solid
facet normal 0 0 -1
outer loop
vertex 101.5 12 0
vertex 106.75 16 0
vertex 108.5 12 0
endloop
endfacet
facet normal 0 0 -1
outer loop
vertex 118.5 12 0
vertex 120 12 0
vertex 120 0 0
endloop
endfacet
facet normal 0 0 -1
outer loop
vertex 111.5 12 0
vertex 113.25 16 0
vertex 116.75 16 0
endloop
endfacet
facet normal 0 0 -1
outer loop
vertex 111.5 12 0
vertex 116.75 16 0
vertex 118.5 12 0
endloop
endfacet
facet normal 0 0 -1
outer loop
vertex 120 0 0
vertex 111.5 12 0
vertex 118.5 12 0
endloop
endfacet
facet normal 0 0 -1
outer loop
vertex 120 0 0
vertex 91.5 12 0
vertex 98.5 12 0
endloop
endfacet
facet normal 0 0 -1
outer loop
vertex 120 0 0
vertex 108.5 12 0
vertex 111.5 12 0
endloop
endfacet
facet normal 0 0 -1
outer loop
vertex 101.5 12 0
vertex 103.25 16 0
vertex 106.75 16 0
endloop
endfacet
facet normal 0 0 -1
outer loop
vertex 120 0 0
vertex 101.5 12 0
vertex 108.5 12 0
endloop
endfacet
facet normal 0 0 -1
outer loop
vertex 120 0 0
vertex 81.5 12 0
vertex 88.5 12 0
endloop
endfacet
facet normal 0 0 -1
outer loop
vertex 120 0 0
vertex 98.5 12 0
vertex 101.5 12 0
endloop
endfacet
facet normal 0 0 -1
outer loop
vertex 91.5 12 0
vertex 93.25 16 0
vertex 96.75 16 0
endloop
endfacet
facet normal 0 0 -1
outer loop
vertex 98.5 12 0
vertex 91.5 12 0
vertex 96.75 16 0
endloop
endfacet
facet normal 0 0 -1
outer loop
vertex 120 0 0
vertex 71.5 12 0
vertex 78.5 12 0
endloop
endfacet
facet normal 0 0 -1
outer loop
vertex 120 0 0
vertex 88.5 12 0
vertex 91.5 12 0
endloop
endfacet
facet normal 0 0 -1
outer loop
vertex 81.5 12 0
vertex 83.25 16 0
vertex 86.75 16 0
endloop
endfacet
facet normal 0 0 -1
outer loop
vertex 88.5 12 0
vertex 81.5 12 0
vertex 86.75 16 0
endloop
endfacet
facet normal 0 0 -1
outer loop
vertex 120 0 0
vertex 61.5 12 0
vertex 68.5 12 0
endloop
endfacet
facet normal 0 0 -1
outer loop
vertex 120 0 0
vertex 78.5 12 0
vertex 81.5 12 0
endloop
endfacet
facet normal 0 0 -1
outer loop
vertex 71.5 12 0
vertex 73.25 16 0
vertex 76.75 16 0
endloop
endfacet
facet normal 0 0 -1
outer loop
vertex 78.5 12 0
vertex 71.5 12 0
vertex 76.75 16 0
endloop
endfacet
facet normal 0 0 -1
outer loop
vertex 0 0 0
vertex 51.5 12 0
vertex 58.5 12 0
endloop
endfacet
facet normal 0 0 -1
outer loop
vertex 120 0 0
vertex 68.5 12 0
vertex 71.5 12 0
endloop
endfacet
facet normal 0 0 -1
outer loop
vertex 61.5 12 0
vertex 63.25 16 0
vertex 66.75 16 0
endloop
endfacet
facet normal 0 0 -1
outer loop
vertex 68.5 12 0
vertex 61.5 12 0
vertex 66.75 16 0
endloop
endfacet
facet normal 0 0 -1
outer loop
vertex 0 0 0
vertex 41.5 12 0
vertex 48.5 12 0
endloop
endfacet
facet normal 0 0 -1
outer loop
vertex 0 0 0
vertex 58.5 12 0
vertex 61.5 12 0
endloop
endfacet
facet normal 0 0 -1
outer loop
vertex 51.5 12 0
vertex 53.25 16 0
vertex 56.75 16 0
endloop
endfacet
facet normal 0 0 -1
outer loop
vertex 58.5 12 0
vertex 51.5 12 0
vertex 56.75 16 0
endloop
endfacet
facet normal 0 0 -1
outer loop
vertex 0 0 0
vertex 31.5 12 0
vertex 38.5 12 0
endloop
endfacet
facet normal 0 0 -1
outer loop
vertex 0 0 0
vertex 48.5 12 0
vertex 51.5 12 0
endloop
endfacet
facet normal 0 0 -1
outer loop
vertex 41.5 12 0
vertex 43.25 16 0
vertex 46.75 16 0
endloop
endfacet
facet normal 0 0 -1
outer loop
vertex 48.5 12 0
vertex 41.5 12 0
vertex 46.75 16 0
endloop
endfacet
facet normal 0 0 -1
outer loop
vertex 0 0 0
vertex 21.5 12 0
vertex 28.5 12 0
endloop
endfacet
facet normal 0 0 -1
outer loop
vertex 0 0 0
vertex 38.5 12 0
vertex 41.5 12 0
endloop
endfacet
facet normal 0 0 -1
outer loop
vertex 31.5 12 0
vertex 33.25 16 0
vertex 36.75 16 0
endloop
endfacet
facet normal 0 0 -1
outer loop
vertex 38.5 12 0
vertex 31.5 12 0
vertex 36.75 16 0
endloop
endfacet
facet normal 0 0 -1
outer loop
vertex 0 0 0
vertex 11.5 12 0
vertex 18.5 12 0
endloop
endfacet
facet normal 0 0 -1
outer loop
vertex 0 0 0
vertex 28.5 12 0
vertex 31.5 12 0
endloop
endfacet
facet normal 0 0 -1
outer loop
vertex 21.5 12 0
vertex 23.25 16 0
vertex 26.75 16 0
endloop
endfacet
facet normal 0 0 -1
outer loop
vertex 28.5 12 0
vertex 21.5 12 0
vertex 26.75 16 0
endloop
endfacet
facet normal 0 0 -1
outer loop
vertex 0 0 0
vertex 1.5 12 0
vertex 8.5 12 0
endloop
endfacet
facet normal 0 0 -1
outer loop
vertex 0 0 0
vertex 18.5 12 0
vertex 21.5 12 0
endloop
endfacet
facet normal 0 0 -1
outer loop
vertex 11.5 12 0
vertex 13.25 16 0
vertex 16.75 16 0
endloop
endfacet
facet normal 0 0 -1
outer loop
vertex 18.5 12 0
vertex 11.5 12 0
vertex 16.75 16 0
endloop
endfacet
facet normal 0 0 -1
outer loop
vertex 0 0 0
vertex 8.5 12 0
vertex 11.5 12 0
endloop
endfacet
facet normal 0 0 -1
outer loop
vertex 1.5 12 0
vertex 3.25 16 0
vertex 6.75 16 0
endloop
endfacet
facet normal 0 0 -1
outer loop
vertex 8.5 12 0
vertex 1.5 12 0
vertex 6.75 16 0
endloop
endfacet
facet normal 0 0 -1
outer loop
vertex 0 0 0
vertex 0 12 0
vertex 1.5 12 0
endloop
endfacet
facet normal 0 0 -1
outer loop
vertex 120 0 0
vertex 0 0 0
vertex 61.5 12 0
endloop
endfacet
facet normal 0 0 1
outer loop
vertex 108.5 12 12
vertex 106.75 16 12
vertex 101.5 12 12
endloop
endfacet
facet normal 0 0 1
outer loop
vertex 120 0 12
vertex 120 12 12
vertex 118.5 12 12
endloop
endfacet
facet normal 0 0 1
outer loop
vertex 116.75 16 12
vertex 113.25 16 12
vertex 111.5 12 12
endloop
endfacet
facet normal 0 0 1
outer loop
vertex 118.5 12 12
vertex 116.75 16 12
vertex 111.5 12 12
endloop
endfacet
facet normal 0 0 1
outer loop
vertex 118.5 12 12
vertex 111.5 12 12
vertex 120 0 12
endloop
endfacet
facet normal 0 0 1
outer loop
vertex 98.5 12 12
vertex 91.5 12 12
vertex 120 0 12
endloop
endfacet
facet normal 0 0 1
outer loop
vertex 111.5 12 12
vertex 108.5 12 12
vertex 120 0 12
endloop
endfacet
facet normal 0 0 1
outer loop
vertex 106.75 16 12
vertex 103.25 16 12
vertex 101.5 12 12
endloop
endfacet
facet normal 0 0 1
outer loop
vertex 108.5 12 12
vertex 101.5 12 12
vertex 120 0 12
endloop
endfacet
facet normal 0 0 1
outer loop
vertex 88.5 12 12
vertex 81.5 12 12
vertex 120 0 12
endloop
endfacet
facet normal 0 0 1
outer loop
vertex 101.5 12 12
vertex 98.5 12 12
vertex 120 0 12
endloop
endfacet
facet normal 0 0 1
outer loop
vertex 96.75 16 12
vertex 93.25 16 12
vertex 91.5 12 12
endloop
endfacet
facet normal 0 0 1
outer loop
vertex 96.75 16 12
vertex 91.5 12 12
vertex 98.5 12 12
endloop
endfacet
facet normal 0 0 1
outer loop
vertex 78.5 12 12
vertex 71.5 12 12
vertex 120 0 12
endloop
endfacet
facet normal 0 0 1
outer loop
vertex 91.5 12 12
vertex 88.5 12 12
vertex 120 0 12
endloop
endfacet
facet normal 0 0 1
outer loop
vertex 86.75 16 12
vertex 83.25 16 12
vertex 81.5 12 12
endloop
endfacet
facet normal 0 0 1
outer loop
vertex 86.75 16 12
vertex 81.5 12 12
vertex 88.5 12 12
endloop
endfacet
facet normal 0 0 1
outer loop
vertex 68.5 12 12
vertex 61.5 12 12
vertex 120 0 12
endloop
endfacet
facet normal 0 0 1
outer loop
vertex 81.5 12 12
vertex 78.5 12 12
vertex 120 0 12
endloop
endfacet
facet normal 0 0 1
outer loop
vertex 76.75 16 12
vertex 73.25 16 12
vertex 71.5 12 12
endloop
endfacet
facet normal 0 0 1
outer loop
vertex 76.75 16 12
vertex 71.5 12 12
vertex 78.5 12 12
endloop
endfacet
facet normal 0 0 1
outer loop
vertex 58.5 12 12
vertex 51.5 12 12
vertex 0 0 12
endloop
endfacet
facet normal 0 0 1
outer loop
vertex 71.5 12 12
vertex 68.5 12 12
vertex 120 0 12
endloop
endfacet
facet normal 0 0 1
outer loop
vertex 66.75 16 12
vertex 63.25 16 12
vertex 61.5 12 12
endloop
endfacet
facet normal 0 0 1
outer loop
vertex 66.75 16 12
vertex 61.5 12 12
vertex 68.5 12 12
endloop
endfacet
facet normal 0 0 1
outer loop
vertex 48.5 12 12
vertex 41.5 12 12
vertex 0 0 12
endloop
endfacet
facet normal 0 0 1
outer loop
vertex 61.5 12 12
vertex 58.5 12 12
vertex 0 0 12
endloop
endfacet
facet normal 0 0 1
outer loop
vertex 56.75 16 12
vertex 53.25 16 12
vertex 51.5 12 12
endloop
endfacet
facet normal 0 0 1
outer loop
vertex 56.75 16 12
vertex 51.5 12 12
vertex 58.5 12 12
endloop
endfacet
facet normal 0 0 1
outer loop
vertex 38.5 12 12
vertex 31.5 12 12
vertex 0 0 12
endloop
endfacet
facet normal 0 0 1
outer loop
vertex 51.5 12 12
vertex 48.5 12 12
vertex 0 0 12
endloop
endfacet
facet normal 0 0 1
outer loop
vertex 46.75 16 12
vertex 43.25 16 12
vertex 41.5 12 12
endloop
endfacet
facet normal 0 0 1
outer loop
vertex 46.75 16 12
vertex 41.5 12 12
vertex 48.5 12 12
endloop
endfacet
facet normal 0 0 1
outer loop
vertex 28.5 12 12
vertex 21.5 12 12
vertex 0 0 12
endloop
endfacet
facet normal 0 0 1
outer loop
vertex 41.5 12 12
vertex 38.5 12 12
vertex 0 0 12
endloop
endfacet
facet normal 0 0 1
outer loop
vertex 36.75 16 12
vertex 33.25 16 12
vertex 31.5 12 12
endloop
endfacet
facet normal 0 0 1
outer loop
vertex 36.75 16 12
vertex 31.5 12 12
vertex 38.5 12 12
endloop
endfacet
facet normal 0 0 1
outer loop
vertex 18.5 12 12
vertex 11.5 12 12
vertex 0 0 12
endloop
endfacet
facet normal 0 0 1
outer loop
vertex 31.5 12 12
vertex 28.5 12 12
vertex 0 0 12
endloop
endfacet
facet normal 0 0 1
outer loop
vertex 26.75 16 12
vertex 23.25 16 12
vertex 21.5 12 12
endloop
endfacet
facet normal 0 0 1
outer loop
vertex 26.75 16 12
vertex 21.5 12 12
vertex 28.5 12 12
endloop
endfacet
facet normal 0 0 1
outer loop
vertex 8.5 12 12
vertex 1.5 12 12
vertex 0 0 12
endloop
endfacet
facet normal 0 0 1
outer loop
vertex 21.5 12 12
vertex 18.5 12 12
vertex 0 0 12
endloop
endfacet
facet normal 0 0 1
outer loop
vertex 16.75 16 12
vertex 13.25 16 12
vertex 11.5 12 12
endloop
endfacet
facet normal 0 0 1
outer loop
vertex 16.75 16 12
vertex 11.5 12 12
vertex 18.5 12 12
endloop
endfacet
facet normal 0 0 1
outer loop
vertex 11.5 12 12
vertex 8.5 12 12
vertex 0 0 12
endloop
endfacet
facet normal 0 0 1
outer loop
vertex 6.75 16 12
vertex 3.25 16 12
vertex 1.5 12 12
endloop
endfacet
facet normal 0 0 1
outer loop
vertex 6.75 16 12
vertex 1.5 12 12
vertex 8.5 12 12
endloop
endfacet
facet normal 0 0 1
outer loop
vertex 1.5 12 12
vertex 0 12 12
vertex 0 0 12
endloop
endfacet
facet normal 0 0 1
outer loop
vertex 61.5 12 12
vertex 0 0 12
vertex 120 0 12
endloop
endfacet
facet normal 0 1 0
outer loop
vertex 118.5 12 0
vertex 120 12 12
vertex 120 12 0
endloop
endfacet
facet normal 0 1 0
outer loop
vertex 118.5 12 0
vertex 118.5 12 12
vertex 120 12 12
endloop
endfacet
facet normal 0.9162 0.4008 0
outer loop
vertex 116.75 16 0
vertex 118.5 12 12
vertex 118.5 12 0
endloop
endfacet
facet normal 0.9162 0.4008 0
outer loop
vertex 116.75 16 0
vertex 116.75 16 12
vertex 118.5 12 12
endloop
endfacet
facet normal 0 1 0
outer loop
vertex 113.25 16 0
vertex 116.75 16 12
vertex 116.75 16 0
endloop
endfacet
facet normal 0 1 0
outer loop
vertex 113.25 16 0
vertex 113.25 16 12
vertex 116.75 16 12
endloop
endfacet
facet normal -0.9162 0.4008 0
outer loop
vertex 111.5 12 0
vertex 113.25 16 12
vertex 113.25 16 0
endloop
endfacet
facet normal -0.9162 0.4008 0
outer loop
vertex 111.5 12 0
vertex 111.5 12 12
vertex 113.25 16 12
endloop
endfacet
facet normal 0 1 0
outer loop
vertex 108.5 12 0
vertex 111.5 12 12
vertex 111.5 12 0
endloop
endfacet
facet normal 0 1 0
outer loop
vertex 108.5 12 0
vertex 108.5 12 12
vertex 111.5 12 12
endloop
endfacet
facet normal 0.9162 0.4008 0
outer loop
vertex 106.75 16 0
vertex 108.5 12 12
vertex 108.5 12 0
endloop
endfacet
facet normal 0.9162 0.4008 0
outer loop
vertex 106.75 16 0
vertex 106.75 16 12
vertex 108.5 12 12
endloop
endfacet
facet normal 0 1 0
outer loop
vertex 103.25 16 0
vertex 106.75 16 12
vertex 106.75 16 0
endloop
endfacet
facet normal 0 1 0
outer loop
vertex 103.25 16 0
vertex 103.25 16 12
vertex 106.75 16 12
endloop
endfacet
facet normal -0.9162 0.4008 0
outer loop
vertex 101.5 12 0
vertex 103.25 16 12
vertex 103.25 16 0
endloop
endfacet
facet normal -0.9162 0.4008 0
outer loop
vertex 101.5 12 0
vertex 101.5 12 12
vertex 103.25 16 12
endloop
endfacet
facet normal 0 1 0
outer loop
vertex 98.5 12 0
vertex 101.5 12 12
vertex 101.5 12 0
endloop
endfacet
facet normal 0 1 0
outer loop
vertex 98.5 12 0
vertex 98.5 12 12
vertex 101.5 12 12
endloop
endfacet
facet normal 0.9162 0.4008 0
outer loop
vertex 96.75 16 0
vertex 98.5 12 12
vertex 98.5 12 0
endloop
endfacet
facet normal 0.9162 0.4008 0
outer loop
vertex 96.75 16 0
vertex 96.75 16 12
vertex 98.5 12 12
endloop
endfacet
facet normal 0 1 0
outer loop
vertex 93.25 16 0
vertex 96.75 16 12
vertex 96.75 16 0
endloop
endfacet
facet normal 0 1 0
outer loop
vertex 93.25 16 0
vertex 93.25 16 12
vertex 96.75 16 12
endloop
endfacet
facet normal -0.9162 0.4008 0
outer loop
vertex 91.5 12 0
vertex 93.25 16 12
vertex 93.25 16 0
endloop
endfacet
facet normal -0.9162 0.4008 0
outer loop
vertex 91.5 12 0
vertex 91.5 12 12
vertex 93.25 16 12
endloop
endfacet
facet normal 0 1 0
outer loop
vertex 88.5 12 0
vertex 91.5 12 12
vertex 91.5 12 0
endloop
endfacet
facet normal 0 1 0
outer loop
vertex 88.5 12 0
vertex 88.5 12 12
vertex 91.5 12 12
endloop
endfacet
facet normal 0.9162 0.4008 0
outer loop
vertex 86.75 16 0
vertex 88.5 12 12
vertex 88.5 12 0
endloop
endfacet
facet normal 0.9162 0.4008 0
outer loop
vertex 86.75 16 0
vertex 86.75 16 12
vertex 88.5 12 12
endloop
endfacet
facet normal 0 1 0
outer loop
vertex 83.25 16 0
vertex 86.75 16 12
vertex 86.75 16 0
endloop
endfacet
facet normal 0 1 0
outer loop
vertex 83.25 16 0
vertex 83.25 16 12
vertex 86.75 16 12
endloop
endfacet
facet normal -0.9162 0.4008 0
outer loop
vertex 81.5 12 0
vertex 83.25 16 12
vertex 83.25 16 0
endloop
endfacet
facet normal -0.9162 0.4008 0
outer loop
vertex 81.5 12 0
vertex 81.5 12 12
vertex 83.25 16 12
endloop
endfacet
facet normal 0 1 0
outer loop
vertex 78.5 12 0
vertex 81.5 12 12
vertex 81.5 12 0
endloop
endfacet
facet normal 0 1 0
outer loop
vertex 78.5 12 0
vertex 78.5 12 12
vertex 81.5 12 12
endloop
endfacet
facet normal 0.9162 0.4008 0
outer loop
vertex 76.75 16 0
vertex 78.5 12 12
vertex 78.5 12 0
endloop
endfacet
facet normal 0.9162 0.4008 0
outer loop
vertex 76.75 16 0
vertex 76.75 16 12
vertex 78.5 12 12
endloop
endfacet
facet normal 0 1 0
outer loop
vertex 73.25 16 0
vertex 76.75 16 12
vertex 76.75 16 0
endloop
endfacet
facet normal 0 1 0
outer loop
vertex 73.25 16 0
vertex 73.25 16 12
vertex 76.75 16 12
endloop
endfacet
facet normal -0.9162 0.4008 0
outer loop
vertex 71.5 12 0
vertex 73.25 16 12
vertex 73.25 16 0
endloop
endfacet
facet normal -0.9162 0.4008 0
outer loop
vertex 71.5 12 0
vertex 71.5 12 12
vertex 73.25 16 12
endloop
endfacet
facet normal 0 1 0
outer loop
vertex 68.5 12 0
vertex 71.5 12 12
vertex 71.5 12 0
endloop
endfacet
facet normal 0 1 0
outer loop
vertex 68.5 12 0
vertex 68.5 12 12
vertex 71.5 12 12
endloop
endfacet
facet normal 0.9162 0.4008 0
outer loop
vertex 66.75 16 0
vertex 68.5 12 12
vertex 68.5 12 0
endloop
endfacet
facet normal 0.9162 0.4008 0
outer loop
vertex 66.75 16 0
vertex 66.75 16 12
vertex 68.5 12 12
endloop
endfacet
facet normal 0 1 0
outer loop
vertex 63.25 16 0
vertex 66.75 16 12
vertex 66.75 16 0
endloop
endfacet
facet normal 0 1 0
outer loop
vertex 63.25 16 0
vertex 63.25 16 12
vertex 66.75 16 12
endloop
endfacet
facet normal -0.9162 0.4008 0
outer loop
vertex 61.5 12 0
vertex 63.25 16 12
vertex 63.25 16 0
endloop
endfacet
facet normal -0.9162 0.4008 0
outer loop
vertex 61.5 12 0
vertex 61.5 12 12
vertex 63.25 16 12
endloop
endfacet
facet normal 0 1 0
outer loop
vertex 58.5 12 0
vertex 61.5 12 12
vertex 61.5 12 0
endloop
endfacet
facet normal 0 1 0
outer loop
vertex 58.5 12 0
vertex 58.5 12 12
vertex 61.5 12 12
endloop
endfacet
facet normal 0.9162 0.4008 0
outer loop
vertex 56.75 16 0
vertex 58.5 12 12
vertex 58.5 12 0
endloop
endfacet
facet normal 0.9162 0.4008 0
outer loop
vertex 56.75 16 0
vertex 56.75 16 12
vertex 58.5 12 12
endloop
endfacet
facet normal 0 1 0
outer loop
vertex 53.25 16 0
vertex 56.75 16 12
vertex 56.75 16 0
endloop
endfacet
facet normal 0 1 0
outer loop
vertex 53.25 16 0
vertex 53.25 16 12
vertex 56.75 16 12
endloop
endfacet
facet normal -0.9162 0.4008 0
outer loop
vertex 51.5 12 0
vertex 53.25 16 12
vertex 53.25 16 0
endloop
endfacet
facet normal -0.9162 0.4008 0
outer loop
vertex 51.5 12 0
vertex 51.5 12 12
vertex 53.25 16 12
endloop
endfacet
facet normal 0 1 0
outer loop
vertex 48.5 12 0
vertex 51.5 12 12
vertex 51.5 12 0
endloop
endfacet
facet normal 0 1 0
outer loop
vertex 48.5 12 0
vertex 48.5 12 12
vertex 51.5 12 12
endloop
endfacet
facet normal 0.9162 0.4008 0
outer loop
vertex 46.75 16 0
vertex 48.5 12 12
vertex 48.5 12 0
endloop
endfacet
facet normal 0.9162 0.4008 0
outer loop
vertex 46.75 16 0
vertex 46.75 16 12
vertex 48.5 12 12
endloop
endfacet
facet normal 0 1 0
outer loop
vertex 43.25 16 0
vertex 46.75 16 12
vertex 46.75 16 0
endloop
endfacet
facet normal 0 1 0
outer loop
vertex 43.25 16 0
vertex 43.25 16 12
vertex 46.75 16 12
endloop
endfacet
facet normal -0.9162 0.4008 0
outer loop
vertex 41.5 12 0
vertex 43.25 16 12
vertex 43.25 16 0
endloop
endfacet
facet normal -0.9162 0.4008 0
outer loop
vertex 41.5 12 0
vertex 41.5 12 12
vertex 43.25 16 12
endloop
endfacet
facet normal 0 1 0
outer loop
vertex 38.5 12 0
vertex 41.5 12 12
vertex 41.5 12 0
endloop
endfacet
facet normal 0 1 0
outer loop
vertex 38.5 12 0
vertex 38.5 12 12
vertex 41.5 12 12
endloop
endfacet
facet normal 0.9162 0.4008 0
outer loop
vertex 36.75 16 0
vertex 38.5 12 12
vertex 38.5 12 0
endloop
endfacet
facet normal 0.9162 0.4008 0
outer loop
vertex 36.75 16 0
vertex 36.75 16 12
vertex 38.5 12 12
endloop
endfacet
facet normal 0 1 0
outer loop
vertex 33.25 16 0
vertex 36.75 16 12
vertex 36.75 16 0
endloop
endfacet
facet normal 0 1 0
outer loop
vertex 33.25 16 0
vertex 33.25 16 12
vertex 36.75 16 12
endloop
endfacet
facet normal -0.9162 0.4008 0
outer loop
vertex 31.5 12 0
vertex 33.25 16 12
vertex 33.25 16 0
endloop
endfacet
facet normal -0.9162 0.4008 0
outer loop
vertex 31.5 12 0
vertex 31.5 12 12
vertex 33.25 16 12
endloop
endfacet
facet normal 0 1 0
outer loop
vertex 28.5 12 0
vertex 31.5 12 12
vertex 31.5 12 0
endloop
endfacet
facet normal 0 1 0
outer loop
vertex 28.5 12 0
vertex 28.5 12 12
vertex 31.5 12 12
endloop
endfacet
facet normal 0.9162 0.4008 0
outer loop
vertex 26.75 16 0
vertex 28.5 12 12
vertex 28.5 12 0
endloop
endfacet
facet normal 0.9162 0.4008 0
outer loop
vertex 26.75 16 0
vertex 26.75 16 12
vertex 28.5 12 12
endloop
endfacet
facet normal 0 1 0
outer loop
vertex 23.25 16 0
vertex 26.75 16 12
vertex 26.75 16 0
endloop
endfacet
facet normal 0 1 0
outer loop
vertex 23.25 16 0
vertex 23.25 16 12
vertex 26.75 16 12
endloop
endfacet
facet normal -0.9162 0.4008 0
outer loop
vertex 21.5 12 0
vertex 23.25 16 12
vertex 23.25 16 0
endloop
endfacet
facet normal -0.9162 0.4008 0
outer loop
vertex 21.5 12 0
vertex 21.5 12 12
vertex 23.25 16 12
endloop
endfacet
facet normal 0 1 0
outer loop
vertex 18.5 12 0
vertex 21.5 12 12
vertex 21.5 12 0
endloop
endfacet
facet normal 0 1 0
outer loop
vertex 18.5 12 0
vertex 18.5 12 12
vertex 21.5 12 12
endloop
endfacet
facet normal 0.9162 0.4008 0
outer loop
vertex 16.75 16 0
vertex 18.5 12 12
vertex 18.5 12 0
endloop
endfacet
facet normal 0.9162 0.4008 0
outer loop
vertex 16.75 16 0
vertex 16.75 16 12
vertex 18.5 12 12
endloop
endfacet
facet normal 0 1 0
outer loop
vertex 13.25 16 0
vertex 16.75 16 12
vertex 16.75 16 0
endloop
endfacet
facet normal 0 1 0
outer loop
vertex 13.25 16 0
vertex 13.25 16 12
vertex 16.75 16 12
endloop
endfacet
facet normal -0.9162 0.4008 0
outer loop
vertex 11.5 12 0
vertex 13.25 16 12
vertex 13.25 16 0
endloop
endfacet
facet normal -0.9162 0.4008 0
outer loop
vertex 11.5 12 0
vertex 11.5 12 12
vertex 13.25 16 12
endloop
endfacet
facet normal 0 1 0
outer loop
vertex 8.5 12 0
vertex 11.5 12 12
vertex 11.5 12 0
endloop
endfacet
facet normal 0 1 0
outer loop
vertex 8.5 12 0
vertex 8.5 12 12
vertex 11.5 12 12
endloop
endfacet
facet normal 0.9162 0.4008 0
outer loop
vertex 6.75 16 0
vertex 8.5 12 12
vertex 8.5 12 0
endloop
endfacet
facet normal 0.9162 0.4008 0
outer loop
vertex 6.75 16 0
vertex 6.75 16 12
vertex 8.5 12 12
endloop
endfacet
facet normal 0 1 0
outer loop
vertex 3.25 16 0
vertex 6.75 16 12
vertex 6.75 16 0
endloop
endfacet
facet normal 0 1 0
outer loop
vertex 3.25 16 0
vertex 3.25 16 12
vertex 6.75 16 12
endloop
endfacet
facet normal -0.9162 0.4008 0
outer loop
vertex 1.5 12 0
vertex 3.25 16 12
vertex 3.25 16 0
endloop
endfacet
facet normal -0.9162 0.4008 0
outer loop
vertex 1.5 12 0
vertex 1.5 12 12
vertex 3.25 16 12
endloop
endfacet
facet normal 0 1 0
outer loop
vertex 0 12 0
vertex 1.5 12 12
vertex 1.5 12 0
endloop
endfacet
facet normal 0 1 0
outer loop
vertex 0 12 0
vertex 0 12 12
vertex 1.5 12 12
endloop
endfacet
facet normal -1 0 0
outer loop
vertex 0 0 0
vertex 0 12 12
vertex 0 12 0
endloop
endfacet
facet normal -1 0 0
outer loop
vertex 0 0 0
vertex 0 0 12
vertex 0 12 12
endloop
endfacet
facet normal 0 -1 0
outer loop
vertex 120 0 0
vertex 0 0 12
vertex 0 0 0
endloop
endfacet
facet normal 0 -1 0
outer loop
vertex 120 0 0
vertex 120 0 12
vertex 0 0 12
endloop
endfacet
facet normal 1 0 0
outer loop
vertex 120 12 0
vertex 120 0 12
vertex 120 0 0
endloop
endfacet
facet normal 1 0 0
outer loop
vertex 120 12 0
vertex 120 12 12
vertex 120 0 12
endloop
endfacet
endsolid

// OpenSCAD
$fn = 32;

// ----------------------------------------------------------------------
// Gear rack: 12 teeth, pitch 10 mm
// ----------------------------------------------------------------------

// --- parameters (mm) ---
teeth = 12;               // number of teeth
pitch = 10;               // tooth pitch, X
root_w = 7;               // tooth width at the root
tip_w = 3.5;              // tooth width at the tip
base_h = 12;              // rack body height, Y
tooth_h = 4;              // tooth height above the body
plate_t = 12;             // rack width, Z (extrusion height)
fit_tol = 0.05;           // declared fit tolerance (prompt contract)
free_tol = 0.3;           // declared free tolerance (prompt contract)

rack_l = teeth * pitch;  // overall length
total_h = base_h + tooth_h;  // overall height

profile = [[0, 0], [120, 0], [120, 12], [118.5, 12], [116.75, 16], [113.25, 16], [111.5, 12], [108.5, 12], [106.75, 16], [103.25, 16], [101.5, 12], [98.5, 12], [96.75, 16], [93.25, 16], [91.5, 12], [88.5, 12], [86.75, 16], [83.25, 16], [81.5, 12], [78.5, 12], [76.75, 16], [73.25, 16], [71.5, 12], [68.5, 12], [66.75, 16], [63.25, 16], [61.5, 12], [58.5, 12], [56.75, 16], [53.25, 16], [51.5, 12], [48.5, 12], [46.75, 16], [43.25, 16], [41.5, 12], [38.5, 12], [36.75, 16], [33.25, 16], [31.5, 12], [28.5, 12], [26.75, 16], [23.25, 16], [21.5, 12], [18.5, 12], [16.75, 16], [13.25, 16], [11.5, 12], [8.5, 12], [6.75, 16], [3.25, 16], [1.5, 12], [0, 12]];  // primary outline, 52 points, counter clockwise

// --- the one profile operation ---
linear_extrude(height = plate_t) polygon(points = profile);
